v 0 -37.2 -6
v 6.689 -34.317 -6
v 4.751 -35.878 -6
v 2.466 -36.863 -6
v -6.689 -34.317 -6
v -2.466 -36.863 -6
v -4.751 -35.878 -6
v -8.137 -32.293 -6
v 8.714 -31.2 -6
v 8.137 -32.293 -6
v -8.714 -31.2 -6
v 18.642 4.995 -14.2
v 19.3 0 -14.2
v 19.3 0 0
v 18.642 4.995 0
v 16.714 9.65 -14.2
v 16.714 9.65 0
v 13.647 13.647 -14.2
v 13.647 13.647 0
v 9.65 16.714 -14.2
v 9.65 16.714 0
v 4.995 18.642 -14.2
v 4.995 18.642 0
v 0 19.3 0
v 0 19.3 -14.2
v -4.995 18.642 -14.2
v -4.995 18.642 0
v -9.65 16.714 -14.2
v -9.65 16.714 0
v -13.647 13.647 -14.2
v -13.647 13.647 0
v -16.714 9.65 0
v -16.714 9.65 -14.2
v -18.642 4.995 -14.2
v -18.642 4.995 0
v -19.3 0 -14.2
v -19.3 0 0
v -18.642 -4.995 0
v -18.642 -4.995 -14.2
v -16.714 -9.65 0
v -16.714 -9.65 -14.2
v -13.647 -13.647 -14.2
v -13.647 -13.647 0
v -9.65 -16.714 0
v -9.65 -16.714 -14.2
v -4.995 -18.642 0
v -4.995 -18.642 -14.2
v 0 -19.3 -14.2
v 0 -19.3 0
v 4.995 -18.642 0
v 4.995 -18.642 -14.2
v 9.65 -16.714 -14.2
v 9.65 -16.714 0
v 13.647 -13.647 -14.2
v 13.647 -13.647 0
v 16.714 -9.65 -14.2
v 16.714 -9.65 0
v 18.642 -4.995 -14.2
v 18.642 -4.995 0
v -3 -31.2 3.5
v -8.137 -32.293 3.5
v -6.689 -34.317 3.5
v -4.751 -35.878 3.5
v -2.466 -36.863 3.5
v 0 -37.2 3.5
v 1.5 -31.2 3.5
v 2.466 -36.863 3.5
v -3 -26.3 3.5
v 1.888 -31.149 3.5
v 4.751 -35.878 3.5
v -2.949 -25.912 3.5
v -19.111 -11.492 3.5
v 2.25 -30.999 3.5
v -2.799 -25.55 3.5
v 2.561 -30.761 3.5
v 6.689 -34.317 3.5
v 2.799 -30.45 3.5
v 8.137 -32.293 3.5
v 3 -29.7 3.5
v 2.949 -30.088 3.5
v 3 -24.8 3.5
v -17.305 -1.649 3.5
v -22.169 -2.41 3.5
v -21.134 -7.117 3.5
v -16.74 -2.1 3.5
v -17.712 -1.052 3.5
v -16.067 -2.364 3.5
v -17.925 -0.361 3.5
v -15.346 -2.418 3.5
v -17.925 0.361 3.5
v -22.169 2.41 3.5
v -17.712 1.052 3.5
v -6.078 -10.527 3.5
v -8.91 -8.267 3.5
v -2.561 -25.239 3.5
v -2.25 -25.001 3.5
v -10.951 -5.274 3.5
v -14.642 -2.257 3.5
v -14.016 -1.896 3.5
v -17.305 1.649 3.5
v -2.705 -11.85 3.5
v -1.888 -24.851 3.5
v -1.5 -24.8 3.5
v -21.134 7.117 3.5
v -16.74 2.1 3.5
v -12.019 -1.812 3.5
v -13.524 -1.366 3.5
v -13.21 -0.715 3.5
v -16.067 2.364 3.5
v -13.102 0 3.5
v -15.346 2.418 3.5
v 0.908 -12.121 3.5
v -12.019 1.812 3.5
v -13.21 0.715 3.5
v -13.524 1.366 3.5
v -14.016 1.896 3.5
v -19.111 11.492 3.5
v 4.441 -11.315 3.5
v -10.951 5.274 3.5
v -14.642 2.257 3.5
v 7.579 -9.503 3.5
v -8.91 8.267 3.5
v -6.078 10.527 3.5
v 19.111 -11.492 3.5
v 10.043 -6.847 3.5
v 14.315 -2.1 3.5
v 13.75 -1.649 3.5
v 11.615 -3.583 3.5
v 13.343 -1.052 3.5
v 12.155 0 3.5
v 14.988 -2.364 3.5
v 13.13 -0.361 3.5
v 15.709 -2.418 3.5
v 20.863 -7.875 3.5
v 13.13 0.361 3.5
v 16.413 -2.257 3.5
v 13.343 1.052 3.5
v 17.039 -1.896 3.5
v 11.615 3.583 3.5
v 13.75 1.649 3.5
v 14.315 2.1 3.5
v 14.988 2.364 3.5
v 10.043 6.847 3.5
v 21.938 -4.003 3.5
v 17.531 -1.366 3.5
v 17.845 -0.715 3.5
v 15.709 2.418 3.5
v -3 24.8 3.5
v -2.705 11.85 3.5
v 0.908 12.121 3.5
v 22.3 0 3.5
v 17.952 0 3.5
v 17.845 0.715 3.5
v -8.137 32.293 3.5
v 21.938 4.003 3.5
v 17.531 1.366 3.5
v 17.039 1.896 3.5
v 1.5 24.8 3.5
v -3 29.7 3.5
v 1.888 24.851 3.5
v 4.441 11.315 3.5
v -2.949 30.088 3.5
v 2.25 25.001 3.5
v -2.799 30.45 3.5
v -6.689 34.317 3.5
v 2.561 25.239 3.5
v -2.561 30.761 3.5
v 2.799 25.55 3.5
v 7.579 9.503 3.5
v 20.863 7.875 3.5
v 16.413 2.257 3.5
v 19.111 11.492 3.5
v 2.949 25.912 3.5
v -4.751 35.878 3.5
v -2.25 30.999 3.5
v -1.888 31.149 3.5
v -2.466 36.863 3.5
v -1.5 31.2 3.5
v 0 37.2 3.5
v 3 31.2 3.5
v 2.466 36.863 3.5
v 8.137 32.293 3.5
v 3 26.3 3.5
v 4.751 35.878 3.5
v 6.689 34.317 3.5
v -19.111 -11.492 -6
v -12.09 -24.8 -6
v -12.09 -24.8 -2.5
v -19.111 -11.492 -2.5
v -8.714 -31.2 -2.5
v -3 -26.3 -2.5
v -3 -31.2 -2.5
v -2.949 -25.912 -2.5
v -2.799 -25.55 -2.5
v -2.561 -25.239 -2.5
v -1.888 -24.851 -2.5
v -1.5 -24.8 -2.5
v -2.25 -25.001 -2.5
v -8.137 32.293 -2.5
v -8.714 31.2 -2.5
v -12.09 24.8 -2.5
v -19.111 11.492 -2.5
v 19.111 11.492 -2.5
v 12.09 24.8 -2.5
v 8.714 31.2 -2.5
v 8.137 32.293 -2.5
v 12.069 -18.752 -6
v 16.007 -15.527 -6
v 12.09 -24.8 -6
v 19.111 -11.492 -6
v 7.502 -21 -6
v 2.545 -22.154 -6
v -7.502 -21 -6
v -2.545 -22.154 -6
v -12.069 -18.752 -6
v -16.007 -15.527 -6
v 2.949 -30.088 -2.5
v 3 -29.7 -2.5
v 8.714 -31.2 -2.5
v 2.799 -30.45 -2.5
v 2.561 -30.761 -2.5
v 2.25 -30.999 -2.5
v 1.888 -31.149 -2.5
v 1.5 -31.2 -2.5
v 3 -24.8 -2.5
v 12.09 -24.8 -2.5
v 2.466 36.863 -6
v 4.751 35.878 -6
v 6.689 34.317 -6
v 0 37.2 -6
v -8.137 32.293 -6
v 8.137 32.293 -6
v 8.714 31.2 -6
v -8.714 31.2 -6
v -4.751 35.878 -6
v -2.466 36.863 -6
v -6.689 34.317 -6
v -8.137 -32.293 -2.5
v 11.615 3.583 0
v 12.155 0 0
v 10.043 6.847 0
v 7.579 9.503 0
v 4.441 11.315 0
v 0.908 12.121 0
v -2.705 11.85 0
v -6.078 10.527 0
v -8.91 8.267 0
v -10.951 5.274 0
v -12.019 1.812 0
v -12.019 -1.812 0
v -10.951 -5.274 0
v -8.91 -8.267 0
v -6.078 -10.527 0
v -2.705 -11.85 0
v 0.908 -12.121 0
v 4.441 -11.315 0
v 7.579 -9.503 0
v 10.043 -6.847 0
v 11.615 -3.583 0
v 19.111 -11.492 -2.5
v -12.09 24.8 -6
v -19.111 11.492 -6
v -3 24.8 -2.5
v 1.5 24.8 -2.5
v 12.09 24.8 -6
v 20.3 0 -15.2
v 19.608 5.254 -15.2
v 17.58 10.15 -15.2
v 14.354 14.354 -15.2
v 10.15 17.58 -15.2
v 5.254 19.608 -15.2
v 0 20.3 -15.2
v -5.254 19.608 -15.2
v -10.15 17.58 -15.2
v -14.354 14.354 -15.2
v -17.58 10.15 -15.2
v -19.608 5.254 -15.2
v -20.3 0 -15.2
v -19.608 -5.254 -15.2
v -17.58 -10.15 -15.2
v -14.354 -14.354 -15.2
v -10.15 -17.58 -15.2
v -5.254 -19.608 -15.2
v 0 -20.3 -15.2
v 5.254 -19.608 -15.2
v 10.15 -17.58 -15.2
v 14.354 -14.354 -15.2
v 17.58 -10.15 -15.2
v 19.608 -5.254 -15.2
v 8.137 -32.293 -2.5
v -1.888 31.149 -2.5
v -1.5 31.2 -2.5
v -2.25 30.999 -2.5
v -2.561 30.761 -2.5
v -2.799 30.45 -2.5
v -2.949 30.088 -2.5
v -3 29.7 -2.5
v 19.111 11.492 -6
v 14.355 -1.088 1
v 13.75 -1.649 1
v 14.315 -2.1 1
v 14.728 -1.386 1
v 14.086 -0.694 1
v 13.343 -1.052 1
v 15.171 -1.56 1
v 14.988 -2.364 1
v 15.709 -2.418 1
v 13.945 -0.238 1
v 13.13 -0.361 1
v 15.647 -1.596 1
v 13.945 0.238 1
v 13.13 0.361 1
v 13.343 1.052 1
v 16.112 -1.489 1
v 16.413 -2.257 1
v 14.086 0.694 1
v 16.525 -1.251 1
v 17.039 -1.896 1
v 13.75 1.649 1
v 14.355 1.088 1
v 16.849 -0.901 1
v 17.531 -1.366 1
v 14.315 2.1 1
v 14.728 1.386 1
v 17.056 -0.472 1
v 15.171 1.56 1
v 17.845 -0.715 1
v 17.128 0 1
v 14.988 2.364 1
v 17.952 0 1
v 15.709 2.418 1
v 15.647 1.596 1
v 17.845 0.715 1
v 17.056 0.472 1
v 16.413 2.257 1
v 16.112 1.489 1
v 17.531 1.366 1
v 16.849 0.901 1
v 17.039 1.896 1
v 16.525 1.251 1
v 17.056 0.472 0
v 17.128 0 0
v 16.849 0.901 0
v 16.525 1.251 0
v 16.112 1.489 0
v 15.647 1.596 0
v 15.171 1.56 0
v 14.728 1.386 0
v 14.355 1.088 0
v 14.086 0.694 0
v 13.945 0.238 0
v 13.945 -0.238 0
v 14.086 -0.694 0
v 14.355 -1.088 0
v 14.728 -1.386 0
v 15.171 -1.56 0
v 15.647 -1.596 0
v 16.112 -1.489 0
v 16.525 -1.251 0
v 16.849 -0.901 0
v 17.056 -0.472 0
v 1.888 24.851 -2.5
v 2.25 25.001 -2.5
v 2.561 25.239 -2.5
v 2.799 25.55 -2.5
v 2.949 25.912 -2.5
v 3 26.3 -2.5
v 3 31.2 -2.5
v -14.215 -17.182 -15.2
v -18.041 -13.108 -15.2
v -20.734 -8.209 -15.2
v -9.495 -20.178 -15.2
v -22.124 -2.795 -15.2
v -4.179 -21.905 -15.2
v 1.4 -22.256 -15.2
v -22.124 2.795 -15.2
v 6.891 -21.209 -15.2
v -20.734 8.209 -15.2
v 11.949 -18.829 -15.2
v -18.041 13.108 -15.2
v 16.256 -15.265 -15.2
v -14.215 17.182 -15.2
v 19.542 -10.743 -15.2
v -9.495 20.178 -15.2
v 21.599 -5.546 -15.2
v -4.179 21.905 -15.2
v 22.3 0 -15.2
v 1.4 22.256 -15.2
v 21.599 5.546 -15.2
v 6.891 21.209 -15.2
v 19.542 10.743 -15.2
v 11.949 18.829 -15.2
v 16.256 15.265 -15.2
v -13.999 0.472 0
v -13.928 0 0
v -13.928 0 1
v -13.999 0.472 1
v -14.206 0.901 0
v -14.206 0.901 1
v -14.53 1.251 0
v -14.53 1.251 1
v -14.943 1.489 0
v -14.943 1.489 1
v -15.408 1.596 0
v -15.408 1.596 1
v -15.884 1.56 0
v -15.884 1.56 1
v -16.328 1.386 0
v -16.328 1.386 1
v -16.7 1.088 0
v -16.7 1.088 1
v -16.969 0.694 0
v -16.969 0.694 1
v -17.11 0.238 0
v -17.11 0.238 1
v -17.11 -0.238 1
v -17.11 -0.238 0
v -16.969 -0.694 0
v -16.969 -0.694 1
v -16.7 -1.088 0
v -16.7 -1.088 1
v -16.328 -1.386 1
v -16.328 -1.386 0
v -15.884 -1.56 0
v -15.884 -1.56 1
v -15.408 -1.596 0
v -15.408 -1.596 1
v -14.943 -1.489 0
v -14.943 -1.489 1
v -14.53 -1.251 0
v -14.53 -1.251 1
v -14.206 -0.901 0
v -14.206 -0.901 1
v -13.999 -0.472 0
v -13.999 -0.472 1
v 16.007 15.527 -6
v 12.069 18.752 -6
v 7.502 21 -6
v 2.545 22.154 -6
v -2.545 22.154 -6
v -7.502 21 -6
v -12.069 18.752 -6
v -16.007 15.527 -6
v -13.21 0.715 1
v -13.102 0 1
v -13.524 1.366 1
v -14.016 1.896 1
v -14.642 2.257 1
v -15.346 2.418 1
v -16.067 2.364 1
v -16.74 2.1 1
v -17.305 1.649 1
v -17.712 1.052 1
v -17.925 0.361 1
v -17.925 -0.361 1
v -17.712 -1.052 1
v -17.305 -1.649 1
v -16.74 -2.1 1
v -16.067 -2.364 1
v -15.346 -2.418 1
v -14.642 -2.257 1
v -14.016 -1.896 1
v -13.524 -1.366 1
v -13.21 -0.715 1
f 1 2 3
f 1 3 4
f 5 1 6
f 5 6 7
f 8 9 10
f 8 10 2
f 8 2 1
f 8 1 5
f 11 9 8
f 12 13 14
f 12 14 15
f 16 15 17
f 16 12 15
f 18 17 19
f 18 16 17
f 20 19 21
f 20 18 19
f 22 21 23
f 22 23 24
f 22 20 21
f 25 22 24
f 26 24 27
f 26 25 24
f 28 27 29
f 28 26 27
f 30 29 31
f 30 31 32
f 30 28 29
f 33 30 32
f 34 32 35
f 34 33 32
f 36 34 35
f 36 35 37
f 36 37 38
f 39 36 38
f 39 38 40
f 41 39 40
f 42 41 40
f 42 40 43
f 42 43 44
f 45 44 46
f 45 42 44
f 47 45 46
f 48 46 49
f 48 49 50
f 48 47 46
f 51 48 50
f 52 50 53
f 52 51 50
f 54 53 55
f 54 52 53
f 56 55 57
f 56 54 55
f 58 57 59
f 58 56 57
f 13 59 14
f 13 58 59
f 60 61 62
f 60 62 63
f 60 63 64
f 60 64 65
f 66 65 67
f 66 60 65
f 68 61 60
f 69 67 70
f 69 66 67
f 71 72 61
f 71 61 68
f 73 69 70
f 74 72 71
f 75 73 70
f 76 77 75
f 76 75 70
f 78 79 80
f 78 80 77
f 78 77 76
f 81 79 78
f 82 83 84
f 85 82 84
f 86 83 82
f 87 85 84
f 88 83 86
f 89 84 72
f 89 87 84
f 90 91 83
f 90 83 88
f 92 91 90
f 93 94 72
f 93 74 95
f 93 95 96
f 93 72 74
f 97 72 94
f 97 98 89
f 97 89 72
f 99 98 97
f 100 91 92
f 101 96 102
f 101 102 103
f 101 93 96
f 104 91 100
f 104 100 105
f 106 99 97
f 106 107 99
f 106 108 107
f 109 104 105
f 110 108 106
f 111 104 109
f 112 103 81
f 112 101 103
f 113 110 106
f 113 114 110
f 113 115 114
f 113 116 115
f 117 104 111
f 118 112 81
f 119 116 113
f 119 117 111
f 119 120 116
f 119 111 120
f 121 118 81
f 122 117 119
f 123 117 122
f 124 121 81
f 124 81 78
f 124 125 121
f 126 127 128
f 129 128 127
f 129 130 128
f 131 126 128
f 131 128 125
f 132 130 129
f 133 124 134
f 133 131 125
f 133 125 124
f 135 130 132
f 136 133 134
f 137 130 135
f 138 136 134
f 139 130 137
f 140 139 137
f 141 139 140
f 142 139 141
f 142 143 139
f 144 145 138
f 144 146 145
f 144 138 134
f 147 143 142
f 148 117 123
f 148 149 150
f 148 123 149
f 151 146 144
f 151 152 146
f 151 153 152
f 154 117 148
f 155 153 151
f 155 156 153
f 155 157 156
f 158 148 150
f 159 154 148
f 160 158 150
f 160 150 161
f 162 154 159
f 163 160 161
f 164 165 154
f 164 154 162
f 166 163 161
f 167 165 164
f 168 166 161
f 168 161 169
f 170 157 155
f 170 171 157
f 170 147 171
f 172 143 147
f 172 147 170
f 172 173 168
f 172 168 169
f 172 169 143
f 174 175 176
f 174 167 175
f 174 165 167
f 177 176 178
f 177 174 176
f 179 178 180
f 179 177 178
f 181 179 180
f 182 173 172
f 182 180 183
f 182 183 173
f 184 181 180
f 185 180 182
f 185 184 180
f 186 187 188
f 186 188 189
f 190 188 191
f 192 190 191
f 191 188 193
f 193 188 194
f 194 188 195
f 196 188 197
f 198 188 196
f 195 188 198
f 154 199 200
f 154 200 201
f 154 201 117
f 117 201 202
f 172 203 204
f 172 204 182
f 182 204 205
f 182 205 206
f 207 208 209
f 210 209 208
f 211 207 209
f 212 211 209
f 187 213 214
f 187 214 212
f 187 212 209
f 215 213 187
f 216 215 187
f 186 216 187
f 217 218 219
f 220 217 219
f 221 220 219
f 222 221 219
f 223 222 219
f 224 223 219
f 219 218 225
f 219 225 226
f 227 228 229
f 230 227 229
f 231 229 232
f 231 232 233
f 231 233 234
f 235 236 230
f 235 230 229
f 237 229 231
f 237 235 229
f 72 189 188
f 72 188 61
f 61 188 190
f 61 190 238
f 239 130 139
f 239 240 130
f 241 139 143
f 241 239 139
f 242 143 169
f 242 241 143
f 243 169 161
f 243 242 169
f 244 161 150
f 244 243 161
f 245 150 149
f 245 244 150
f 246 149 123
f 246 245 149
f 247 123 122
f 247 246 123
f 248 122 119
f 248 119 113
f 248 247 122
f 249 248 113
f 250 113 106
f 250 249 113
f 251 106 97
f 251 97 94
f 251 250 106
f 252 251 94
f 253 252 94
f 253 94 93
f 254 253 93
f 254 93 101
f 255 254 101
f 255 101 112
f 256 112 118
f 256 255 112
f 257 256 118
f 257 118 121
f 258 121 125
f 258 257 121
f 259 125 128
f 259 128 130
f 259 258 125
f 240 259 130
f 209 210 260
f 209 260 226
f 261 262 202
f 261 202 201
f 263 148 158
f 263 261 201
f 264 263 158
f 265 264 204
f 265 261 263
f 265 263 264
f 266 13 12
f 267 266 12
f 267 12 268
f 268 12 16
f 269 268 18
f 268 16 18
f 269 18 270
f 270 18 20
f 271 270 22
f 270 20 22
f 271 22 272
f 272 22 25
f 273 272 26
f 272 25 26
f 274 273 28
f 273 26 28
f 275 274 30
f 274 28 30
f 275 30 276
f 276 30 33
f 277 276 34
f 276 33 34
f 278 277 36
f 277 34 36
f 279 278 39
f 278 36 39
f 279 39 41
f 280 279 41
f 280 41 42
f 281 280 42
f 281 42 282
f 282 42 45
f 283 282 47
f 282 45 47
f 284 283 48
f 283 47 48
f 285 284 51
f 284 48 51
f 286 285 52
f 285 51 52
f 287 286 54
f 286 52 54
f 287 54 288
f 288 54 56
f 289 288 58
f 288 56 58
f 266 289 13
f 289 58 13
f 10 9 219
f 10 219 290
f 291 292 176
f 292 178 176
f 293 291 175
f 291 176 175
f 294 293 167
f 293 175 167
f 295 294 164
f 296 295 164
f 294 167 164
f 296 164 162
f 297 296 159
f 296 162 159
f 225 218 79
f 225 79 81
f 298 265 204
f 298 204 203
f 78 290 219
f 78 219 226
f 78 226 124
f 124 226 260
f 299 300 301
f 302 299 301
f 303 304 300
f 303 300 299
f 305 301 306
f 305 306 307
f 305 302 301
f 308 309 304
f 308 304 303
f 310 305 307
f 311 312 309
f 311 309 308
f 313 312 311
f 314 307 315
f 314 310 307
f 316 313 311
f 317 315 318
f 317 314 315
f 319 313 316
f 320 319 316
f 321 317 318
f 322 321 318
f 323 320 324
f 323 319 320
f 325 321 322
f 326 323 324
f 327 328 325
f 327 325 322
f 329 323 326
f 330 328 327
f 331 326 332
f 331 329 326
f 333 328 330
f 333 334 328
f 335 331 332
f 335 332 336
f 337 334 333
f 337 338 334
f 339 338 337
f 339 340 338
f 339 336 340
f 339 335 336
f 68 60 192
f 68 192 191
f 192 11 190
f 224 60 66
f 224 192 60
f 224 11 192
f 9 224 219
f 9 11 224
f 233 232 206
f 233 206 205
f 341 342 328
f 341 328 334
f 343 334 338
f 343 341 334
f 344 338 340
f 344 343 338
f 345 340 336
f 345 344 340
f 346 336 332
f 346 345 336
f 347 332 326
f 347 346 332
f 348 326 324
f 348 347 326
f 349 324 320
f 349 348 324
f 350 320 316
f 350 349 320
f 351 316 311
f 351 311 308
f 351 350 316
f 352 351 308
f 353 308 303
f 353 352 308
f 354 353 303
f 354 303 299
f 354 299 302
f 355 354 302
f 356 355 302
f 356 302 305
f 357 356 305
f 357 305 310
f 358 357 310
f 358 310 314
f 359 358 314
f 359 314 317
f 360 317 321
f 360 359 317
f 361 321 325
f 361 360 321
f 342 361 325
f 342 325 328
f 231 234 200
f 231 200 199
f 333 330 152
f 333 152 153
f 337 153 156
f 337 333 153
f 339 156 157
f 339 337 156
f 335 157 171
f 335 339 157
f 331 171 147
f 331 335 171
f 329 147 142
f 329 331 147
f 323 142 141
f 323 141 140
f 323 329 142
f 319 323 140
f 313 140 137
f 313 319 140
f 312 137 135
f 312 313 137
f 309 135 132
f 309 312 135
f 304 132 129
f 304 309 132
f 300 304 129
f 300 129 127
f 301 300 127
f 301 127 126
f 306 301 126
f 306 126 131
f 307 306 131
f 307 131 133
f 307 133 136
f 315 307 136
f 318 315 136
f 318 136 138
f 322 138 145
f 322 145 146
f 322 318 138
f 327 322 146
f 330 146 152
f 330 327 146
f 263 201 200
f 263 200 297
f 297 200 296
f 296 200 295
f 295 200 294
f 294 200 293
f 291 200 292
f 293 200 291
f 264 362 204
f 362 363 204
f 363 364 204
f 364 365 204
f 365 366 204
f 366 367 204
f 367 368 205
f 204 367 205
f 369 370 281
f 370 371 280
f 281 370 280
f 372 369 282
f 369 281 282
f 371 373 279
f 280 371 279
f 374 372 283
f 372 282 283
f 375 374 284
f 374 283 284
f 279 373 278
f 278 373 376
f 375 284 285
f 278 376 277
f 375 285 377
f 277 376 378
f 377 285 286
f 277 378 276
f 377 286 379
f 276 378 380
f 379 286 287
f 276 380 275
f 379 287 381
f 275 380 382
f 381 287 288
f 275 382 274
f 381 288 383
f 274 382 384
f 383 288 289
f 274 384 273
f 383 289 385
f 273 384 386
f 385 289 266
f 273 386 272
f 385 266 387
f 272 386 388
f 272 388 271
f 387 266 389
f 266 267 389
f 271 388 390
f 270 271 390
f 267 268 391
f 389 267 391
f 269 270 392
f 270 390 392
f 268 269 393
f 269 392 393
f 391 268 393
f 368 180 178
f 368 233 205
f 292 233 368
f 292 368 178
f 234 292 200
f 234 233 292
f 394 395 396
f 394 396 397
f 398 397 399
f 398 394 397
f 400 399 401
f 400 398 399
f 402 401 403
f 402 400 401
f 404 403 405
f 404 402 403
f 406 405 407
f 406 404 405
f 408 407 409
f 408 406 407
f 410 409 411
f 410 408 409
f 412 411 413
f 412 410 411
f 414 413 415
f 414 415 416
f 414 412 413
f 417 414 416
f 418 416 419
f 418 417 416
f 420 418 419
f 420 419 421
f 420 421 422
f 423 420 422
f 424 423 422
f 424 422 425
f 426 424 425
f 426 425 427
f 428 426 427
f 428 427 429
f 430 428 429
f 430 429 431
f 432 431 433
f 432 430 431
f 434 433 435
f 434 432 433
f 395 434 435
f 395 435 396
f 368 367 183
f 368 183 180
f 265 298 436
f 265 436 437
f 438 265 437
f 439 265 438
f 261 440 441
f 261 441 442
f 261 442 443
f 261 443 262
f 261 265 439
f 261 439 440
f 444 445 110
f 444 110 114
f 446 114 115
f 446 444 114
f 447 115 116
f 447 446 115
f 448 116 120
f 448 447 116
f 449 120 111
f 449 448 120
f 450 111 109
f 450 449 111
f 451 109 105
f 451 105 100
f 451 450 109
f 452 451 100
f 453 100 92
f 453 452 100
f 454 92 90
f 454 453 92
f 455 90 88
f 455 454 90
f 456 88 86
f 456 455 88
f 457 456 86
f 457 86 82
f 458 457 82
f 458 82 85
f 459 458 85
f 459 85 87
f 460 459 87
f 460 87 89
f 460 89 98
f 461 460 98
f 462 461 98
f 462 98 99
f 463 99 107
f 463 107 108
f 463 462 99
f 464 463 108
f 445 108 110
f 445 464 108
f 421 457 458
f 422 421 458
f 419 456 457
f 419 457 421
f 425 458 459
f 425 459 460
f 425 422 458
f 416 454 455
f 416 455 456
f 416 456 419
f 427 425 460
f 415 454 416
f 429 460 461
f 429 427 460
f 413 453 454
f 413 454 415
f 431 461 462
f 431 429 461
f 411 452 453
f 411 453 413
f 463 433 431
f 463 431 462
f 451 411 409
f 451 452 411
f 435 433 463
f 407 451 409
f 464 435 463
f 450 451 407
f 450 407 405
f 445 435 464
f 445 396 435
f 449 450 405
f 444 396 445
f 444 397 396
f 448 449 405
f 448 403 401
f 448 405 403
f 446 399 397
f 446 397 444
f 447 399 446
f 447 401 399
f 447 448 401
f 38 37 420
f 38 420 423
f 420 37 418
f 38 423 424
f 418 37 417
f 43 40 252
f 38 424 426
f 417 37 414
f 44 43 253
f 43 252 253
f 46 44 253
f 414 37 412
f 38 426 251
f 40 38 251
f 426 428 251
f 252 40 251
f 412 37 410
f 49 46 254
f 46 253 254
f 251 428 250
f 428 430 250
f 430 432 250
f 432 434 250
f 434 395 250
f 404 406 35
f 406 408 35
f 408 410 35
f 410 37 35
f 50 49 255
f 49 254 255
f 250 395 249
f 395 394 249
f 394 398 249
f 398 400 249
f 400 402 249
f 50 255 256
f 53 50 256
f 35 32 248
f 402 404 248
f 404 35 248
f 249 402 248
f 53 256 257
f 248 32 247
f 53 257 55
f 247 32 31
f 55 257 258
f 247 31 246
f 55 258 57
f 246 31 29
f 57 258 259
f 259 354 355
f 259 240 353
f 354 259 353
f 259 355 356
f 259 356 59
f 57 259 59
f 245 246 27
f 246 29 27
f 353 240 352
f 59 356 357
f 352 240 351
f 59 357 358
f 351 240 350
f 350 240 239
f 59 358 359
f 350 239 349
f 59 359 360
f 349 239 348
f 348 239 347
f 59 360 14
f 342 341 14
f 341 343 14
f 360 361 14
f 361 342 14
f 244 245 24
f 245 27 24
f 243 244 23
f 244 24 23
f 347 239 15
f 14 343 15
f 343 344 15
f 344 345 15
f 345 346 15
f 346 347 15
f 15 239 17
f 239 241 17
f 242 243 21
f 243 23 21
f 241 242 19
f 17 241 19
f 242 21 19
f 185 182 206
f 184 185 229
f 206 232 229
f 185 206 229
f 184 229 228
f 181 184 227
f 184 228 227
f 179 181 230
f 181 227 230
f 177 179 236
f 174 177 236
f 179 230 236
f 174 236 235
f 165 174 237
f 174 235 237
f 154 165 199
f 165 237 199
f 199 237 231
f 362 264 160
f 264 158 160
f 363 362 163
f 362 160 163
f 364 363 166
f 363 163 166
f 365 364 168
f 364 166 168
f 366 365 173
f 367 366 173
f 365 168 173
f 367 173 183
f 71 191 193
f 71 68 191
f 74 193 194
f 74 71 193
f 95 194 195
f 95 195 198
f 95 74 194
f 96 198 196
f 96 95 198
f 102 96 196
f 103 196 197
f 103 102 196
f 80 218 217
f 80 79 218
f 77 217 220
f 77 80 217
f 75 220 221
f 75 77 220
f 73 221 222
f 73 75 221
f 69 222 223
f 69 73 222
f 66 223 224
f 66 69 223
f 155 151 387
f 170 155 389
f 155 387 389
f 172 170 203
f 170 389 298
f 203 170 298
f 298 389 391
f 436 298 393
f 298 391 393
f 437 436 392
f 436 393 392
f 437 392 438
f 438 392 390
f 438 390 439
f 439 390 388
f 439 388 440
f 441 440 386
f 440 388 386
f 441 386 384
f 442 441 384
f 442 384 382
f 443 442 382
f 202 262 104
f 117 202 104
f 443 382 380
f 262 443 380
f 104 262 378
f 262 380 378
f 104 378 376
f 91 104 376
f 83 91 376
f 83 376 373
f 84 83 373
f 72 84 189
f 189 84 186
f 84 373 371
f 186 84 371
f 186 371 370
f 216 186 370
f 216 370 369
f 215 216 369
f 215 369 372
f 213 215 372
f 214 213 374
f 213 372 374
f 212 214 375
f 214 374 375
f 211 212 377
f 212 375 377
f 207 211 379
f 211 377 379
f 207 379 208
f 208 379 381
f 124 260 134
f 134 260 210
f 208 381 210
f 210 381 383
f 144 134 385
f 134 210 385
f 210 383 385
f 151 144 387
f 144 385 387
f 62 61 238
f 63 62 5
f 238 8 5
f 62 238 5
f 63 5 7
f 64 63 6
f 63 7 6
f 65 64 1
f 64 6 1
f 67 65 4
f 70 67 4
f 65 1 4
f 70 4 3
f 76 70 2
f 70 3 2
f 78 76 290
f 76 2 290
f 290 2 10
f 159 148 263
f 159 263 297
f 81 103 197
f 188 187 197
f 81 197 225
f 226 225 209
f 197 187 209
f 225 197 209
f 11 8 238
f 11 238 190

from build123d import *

# Parameters (mm, degrees)
SKETCH1_R           = 22.3
SKETCH1_R_2         = 1.6
SKETCH1_R_3         = 12.155
BOSS_EXTRUDE1_DEPTH = 1
BOSS_EXTRUDE2_START = -15.2
SKETCH1_3_R         = 22.3
SKETCH1_3_R_2       = 19.3
BOSS_EXTRUDE2_DEPTH = 15.2
SKETCH3_R           = 22.3
SKETCH3_R_2         = 2.425
SKETCH3_R_3         = 12.155
BOSS_EXTRUDE3_DEPTH = 2.5
BOSS_EXTRUDE4_START = -6
SKETCH4_W           = 6
SKETCH4_H           = 6.4
BOSS_EXTRUDE4_DEPTH = 6
CHAMFER1_SIZE       = 1
BOSS_EXTRUDE5_START = 3.5
BOSS_EXTRUDE5_DEPTH = 3.5
FILLET1_R           = 1.5


with BuildPart() as part:
    # Sketch1 → Boss-Extrude1 (new body)
    with BuildSketch(Plane.XY):
        Circle(SKETCH1_R)
        with Locations((15.5275, 0)):
            Circle(SKETCH1_R_2, mode=Mode.SUBTRACT)
        with Locations((-15.5275, 0)):
            Circle(SKETCH1_R_2, mode=Mode.SUBTRACT)
        Circle(SKETCH1_R_3, mode=Mode.SUBTRACT)
    extrude(amount=BOSS_EXTRUDE1_DEPTH)

    # Sketch1<3> → Boss-Extrude2 (add)
    with BuildSketch(Plane.XY.offset(BOSS_EXTRUDE2_START)):
        Circle(SKETCH1_3_R)
        Circle(SKETCH1_3_R_2, mode=Mode.SUBTRACT)
    extrude(amount=BOSS_EXTRUDE2_DEPTH)

    # Sketch3 → Boss-Extrude3 (add)
    with BuildSketch(Plane.XY.offset(1)):
        Circle(SKETCH3_R)
        with Locations((-15.5275, 0)):
            Circle(SKETCH3_R_2, mode=Mode.SUBTRACT)
        with Locations((15.5275, 0)):
            Circle(SKETCH3_R_2, mode=Mode.SUBTRACT)
        Circle(SKETCH3_R_3, mode=Mode.SUBTRACT)
    extrude(amount=BOSS_EXTRUDE3_DEPTH)

    # Sketch4 → Boss-Extrude4 (add)
    # profile 1 of 2: a face of its own
    with BuildSketch(Plane.XY.offset(3.5).offset(BOSS_EXTRUDE4_START)):
        with BuildLine():
            ThreePointArc((19.110610408, -11.49237007), (0, -22.3), (-19.110610408, -11.49237007))
            Line((-19.110610408, -11.49237007), (-8.137060123, -32.292814061))
            ThreePointArc((-8.137060123, -32.292814061), (0, -37.2), (8.137060123, -32.292814061))
            Line((8.137060123, -32.292814061), (19.110610408, -11.49237007))
        make_face()
        with Locations((0, -28)):
            Rectangle(SKETCH4_W, SKETCH4_H, mode=Mode.SUBTRACT)
    # profile 2 of 2: a face of its own
    with BuildSketch(Plane.XY.offset(3.5).offset(BOSS_EXTRUDE4_START)):
        with BuildLine():
            Line((-8.137060123, 32.292814061), (-19.110610408, 11.49237007))
            ThreePointArc((-19.110610408, 11.49237007), (0, 22.3), (19.110610408, 11.49237007))
            Line((19.110610408, 11.49237007), (8.137060123, 32.292814061))
            ThreePointArc((8.137060123, 32.292814061), (0, 37.2), (-8.137060123, 32.292814061))
        make_face()
        with Locations((0, 28)):
            Rectangle(SKETCH4_W, SKETCH4_H, mode=Mode.SUBTRACT)
    extrude(amount=BOSS_EXTRUDE4_DEPTH)

    # Chamfer1
    chamfer1_edges = [part.edges().sort_by_distance(p)[0] for p in [
        (-19.3, 0, -15.2),
    ]]
    chamfer(chamfer1_edges, length=CHAMFER1_SIZE)

    # Sketch5 → Boss-Extrude5 (add)
    with BuildSketch(Plane(origin=(0, 0, -2.5), x_dir=(-1, 0, 0), z_dir=(0, 0, -1)).offset(BOSS_EXTRUDE5_START)):
        with BuildLine():
            Line((8.713588684, -31.2), (-8.713588684, -31.2))
            Line((-8.713588684, -31.2), (-8.137060123, -32.292814061))
            ThreePointArc((-8.137060123, -32.292814061), (0, -37.2), (8.137060123, -32.292814061))
            Line((8.137060123, -32.292814061), (8.713588684, -31.2))
        make_face()
        with BuildLine():
            Line((-19.110610408, -11.49237007), (-12.089993623, -24.8))
            Line((-12.089993623, -24.8), (12.089993623, -24.8))
            Line((12.089993623, -24.8), (19.110610408, -11.49237007))
            ThreePointArc((19.110610408, -11.49237007), (0, -22.3), (-19.110610408, -11.49237007))
        make_face()
        with BuildLine():
            ThreePointArc((8.137060123, 32.292814061), (0, 37.2), (-8.137060123, 32.292814061))
            Line((-8.137060123, 32.292814061), (-8.713588684, 31.2))
            Line((-8.713588684, 31.2), (8.713588684, 31.2))
            Line((8.713588684, 31.2), (8.137060123, 32.292814061))
        make_face()
        with BuildLine():
            Line((12.089993623, 24.8), (-12.089993623, 24.8))
            Line((-12.089993623, 24.8), (-19.110610408, 11.49237007))
            ThreePointArc((-19.110610408, 11.49237007), (0, 22.3), (19.110610408, 11.49237007))
            Line((19.110610408, 11.49237007), (12.089993623, 24.8))
        make_face()
    extrude(amount=-BOSS_EXTRUDE5_DEPTH)

    # Fillet1
    fillet1_edges = [part.edges().sort_by_distance(p)[0] for p in [
        (3, -31.2, 0.5),
        (-3, -24.8, 0.5),
        (3, 24.8, 0.5),
        (-3, 31.2, 0.5),
    ]]
    fillet(fillet1_edges, radius=FILLET1_R)


solid = part.part
